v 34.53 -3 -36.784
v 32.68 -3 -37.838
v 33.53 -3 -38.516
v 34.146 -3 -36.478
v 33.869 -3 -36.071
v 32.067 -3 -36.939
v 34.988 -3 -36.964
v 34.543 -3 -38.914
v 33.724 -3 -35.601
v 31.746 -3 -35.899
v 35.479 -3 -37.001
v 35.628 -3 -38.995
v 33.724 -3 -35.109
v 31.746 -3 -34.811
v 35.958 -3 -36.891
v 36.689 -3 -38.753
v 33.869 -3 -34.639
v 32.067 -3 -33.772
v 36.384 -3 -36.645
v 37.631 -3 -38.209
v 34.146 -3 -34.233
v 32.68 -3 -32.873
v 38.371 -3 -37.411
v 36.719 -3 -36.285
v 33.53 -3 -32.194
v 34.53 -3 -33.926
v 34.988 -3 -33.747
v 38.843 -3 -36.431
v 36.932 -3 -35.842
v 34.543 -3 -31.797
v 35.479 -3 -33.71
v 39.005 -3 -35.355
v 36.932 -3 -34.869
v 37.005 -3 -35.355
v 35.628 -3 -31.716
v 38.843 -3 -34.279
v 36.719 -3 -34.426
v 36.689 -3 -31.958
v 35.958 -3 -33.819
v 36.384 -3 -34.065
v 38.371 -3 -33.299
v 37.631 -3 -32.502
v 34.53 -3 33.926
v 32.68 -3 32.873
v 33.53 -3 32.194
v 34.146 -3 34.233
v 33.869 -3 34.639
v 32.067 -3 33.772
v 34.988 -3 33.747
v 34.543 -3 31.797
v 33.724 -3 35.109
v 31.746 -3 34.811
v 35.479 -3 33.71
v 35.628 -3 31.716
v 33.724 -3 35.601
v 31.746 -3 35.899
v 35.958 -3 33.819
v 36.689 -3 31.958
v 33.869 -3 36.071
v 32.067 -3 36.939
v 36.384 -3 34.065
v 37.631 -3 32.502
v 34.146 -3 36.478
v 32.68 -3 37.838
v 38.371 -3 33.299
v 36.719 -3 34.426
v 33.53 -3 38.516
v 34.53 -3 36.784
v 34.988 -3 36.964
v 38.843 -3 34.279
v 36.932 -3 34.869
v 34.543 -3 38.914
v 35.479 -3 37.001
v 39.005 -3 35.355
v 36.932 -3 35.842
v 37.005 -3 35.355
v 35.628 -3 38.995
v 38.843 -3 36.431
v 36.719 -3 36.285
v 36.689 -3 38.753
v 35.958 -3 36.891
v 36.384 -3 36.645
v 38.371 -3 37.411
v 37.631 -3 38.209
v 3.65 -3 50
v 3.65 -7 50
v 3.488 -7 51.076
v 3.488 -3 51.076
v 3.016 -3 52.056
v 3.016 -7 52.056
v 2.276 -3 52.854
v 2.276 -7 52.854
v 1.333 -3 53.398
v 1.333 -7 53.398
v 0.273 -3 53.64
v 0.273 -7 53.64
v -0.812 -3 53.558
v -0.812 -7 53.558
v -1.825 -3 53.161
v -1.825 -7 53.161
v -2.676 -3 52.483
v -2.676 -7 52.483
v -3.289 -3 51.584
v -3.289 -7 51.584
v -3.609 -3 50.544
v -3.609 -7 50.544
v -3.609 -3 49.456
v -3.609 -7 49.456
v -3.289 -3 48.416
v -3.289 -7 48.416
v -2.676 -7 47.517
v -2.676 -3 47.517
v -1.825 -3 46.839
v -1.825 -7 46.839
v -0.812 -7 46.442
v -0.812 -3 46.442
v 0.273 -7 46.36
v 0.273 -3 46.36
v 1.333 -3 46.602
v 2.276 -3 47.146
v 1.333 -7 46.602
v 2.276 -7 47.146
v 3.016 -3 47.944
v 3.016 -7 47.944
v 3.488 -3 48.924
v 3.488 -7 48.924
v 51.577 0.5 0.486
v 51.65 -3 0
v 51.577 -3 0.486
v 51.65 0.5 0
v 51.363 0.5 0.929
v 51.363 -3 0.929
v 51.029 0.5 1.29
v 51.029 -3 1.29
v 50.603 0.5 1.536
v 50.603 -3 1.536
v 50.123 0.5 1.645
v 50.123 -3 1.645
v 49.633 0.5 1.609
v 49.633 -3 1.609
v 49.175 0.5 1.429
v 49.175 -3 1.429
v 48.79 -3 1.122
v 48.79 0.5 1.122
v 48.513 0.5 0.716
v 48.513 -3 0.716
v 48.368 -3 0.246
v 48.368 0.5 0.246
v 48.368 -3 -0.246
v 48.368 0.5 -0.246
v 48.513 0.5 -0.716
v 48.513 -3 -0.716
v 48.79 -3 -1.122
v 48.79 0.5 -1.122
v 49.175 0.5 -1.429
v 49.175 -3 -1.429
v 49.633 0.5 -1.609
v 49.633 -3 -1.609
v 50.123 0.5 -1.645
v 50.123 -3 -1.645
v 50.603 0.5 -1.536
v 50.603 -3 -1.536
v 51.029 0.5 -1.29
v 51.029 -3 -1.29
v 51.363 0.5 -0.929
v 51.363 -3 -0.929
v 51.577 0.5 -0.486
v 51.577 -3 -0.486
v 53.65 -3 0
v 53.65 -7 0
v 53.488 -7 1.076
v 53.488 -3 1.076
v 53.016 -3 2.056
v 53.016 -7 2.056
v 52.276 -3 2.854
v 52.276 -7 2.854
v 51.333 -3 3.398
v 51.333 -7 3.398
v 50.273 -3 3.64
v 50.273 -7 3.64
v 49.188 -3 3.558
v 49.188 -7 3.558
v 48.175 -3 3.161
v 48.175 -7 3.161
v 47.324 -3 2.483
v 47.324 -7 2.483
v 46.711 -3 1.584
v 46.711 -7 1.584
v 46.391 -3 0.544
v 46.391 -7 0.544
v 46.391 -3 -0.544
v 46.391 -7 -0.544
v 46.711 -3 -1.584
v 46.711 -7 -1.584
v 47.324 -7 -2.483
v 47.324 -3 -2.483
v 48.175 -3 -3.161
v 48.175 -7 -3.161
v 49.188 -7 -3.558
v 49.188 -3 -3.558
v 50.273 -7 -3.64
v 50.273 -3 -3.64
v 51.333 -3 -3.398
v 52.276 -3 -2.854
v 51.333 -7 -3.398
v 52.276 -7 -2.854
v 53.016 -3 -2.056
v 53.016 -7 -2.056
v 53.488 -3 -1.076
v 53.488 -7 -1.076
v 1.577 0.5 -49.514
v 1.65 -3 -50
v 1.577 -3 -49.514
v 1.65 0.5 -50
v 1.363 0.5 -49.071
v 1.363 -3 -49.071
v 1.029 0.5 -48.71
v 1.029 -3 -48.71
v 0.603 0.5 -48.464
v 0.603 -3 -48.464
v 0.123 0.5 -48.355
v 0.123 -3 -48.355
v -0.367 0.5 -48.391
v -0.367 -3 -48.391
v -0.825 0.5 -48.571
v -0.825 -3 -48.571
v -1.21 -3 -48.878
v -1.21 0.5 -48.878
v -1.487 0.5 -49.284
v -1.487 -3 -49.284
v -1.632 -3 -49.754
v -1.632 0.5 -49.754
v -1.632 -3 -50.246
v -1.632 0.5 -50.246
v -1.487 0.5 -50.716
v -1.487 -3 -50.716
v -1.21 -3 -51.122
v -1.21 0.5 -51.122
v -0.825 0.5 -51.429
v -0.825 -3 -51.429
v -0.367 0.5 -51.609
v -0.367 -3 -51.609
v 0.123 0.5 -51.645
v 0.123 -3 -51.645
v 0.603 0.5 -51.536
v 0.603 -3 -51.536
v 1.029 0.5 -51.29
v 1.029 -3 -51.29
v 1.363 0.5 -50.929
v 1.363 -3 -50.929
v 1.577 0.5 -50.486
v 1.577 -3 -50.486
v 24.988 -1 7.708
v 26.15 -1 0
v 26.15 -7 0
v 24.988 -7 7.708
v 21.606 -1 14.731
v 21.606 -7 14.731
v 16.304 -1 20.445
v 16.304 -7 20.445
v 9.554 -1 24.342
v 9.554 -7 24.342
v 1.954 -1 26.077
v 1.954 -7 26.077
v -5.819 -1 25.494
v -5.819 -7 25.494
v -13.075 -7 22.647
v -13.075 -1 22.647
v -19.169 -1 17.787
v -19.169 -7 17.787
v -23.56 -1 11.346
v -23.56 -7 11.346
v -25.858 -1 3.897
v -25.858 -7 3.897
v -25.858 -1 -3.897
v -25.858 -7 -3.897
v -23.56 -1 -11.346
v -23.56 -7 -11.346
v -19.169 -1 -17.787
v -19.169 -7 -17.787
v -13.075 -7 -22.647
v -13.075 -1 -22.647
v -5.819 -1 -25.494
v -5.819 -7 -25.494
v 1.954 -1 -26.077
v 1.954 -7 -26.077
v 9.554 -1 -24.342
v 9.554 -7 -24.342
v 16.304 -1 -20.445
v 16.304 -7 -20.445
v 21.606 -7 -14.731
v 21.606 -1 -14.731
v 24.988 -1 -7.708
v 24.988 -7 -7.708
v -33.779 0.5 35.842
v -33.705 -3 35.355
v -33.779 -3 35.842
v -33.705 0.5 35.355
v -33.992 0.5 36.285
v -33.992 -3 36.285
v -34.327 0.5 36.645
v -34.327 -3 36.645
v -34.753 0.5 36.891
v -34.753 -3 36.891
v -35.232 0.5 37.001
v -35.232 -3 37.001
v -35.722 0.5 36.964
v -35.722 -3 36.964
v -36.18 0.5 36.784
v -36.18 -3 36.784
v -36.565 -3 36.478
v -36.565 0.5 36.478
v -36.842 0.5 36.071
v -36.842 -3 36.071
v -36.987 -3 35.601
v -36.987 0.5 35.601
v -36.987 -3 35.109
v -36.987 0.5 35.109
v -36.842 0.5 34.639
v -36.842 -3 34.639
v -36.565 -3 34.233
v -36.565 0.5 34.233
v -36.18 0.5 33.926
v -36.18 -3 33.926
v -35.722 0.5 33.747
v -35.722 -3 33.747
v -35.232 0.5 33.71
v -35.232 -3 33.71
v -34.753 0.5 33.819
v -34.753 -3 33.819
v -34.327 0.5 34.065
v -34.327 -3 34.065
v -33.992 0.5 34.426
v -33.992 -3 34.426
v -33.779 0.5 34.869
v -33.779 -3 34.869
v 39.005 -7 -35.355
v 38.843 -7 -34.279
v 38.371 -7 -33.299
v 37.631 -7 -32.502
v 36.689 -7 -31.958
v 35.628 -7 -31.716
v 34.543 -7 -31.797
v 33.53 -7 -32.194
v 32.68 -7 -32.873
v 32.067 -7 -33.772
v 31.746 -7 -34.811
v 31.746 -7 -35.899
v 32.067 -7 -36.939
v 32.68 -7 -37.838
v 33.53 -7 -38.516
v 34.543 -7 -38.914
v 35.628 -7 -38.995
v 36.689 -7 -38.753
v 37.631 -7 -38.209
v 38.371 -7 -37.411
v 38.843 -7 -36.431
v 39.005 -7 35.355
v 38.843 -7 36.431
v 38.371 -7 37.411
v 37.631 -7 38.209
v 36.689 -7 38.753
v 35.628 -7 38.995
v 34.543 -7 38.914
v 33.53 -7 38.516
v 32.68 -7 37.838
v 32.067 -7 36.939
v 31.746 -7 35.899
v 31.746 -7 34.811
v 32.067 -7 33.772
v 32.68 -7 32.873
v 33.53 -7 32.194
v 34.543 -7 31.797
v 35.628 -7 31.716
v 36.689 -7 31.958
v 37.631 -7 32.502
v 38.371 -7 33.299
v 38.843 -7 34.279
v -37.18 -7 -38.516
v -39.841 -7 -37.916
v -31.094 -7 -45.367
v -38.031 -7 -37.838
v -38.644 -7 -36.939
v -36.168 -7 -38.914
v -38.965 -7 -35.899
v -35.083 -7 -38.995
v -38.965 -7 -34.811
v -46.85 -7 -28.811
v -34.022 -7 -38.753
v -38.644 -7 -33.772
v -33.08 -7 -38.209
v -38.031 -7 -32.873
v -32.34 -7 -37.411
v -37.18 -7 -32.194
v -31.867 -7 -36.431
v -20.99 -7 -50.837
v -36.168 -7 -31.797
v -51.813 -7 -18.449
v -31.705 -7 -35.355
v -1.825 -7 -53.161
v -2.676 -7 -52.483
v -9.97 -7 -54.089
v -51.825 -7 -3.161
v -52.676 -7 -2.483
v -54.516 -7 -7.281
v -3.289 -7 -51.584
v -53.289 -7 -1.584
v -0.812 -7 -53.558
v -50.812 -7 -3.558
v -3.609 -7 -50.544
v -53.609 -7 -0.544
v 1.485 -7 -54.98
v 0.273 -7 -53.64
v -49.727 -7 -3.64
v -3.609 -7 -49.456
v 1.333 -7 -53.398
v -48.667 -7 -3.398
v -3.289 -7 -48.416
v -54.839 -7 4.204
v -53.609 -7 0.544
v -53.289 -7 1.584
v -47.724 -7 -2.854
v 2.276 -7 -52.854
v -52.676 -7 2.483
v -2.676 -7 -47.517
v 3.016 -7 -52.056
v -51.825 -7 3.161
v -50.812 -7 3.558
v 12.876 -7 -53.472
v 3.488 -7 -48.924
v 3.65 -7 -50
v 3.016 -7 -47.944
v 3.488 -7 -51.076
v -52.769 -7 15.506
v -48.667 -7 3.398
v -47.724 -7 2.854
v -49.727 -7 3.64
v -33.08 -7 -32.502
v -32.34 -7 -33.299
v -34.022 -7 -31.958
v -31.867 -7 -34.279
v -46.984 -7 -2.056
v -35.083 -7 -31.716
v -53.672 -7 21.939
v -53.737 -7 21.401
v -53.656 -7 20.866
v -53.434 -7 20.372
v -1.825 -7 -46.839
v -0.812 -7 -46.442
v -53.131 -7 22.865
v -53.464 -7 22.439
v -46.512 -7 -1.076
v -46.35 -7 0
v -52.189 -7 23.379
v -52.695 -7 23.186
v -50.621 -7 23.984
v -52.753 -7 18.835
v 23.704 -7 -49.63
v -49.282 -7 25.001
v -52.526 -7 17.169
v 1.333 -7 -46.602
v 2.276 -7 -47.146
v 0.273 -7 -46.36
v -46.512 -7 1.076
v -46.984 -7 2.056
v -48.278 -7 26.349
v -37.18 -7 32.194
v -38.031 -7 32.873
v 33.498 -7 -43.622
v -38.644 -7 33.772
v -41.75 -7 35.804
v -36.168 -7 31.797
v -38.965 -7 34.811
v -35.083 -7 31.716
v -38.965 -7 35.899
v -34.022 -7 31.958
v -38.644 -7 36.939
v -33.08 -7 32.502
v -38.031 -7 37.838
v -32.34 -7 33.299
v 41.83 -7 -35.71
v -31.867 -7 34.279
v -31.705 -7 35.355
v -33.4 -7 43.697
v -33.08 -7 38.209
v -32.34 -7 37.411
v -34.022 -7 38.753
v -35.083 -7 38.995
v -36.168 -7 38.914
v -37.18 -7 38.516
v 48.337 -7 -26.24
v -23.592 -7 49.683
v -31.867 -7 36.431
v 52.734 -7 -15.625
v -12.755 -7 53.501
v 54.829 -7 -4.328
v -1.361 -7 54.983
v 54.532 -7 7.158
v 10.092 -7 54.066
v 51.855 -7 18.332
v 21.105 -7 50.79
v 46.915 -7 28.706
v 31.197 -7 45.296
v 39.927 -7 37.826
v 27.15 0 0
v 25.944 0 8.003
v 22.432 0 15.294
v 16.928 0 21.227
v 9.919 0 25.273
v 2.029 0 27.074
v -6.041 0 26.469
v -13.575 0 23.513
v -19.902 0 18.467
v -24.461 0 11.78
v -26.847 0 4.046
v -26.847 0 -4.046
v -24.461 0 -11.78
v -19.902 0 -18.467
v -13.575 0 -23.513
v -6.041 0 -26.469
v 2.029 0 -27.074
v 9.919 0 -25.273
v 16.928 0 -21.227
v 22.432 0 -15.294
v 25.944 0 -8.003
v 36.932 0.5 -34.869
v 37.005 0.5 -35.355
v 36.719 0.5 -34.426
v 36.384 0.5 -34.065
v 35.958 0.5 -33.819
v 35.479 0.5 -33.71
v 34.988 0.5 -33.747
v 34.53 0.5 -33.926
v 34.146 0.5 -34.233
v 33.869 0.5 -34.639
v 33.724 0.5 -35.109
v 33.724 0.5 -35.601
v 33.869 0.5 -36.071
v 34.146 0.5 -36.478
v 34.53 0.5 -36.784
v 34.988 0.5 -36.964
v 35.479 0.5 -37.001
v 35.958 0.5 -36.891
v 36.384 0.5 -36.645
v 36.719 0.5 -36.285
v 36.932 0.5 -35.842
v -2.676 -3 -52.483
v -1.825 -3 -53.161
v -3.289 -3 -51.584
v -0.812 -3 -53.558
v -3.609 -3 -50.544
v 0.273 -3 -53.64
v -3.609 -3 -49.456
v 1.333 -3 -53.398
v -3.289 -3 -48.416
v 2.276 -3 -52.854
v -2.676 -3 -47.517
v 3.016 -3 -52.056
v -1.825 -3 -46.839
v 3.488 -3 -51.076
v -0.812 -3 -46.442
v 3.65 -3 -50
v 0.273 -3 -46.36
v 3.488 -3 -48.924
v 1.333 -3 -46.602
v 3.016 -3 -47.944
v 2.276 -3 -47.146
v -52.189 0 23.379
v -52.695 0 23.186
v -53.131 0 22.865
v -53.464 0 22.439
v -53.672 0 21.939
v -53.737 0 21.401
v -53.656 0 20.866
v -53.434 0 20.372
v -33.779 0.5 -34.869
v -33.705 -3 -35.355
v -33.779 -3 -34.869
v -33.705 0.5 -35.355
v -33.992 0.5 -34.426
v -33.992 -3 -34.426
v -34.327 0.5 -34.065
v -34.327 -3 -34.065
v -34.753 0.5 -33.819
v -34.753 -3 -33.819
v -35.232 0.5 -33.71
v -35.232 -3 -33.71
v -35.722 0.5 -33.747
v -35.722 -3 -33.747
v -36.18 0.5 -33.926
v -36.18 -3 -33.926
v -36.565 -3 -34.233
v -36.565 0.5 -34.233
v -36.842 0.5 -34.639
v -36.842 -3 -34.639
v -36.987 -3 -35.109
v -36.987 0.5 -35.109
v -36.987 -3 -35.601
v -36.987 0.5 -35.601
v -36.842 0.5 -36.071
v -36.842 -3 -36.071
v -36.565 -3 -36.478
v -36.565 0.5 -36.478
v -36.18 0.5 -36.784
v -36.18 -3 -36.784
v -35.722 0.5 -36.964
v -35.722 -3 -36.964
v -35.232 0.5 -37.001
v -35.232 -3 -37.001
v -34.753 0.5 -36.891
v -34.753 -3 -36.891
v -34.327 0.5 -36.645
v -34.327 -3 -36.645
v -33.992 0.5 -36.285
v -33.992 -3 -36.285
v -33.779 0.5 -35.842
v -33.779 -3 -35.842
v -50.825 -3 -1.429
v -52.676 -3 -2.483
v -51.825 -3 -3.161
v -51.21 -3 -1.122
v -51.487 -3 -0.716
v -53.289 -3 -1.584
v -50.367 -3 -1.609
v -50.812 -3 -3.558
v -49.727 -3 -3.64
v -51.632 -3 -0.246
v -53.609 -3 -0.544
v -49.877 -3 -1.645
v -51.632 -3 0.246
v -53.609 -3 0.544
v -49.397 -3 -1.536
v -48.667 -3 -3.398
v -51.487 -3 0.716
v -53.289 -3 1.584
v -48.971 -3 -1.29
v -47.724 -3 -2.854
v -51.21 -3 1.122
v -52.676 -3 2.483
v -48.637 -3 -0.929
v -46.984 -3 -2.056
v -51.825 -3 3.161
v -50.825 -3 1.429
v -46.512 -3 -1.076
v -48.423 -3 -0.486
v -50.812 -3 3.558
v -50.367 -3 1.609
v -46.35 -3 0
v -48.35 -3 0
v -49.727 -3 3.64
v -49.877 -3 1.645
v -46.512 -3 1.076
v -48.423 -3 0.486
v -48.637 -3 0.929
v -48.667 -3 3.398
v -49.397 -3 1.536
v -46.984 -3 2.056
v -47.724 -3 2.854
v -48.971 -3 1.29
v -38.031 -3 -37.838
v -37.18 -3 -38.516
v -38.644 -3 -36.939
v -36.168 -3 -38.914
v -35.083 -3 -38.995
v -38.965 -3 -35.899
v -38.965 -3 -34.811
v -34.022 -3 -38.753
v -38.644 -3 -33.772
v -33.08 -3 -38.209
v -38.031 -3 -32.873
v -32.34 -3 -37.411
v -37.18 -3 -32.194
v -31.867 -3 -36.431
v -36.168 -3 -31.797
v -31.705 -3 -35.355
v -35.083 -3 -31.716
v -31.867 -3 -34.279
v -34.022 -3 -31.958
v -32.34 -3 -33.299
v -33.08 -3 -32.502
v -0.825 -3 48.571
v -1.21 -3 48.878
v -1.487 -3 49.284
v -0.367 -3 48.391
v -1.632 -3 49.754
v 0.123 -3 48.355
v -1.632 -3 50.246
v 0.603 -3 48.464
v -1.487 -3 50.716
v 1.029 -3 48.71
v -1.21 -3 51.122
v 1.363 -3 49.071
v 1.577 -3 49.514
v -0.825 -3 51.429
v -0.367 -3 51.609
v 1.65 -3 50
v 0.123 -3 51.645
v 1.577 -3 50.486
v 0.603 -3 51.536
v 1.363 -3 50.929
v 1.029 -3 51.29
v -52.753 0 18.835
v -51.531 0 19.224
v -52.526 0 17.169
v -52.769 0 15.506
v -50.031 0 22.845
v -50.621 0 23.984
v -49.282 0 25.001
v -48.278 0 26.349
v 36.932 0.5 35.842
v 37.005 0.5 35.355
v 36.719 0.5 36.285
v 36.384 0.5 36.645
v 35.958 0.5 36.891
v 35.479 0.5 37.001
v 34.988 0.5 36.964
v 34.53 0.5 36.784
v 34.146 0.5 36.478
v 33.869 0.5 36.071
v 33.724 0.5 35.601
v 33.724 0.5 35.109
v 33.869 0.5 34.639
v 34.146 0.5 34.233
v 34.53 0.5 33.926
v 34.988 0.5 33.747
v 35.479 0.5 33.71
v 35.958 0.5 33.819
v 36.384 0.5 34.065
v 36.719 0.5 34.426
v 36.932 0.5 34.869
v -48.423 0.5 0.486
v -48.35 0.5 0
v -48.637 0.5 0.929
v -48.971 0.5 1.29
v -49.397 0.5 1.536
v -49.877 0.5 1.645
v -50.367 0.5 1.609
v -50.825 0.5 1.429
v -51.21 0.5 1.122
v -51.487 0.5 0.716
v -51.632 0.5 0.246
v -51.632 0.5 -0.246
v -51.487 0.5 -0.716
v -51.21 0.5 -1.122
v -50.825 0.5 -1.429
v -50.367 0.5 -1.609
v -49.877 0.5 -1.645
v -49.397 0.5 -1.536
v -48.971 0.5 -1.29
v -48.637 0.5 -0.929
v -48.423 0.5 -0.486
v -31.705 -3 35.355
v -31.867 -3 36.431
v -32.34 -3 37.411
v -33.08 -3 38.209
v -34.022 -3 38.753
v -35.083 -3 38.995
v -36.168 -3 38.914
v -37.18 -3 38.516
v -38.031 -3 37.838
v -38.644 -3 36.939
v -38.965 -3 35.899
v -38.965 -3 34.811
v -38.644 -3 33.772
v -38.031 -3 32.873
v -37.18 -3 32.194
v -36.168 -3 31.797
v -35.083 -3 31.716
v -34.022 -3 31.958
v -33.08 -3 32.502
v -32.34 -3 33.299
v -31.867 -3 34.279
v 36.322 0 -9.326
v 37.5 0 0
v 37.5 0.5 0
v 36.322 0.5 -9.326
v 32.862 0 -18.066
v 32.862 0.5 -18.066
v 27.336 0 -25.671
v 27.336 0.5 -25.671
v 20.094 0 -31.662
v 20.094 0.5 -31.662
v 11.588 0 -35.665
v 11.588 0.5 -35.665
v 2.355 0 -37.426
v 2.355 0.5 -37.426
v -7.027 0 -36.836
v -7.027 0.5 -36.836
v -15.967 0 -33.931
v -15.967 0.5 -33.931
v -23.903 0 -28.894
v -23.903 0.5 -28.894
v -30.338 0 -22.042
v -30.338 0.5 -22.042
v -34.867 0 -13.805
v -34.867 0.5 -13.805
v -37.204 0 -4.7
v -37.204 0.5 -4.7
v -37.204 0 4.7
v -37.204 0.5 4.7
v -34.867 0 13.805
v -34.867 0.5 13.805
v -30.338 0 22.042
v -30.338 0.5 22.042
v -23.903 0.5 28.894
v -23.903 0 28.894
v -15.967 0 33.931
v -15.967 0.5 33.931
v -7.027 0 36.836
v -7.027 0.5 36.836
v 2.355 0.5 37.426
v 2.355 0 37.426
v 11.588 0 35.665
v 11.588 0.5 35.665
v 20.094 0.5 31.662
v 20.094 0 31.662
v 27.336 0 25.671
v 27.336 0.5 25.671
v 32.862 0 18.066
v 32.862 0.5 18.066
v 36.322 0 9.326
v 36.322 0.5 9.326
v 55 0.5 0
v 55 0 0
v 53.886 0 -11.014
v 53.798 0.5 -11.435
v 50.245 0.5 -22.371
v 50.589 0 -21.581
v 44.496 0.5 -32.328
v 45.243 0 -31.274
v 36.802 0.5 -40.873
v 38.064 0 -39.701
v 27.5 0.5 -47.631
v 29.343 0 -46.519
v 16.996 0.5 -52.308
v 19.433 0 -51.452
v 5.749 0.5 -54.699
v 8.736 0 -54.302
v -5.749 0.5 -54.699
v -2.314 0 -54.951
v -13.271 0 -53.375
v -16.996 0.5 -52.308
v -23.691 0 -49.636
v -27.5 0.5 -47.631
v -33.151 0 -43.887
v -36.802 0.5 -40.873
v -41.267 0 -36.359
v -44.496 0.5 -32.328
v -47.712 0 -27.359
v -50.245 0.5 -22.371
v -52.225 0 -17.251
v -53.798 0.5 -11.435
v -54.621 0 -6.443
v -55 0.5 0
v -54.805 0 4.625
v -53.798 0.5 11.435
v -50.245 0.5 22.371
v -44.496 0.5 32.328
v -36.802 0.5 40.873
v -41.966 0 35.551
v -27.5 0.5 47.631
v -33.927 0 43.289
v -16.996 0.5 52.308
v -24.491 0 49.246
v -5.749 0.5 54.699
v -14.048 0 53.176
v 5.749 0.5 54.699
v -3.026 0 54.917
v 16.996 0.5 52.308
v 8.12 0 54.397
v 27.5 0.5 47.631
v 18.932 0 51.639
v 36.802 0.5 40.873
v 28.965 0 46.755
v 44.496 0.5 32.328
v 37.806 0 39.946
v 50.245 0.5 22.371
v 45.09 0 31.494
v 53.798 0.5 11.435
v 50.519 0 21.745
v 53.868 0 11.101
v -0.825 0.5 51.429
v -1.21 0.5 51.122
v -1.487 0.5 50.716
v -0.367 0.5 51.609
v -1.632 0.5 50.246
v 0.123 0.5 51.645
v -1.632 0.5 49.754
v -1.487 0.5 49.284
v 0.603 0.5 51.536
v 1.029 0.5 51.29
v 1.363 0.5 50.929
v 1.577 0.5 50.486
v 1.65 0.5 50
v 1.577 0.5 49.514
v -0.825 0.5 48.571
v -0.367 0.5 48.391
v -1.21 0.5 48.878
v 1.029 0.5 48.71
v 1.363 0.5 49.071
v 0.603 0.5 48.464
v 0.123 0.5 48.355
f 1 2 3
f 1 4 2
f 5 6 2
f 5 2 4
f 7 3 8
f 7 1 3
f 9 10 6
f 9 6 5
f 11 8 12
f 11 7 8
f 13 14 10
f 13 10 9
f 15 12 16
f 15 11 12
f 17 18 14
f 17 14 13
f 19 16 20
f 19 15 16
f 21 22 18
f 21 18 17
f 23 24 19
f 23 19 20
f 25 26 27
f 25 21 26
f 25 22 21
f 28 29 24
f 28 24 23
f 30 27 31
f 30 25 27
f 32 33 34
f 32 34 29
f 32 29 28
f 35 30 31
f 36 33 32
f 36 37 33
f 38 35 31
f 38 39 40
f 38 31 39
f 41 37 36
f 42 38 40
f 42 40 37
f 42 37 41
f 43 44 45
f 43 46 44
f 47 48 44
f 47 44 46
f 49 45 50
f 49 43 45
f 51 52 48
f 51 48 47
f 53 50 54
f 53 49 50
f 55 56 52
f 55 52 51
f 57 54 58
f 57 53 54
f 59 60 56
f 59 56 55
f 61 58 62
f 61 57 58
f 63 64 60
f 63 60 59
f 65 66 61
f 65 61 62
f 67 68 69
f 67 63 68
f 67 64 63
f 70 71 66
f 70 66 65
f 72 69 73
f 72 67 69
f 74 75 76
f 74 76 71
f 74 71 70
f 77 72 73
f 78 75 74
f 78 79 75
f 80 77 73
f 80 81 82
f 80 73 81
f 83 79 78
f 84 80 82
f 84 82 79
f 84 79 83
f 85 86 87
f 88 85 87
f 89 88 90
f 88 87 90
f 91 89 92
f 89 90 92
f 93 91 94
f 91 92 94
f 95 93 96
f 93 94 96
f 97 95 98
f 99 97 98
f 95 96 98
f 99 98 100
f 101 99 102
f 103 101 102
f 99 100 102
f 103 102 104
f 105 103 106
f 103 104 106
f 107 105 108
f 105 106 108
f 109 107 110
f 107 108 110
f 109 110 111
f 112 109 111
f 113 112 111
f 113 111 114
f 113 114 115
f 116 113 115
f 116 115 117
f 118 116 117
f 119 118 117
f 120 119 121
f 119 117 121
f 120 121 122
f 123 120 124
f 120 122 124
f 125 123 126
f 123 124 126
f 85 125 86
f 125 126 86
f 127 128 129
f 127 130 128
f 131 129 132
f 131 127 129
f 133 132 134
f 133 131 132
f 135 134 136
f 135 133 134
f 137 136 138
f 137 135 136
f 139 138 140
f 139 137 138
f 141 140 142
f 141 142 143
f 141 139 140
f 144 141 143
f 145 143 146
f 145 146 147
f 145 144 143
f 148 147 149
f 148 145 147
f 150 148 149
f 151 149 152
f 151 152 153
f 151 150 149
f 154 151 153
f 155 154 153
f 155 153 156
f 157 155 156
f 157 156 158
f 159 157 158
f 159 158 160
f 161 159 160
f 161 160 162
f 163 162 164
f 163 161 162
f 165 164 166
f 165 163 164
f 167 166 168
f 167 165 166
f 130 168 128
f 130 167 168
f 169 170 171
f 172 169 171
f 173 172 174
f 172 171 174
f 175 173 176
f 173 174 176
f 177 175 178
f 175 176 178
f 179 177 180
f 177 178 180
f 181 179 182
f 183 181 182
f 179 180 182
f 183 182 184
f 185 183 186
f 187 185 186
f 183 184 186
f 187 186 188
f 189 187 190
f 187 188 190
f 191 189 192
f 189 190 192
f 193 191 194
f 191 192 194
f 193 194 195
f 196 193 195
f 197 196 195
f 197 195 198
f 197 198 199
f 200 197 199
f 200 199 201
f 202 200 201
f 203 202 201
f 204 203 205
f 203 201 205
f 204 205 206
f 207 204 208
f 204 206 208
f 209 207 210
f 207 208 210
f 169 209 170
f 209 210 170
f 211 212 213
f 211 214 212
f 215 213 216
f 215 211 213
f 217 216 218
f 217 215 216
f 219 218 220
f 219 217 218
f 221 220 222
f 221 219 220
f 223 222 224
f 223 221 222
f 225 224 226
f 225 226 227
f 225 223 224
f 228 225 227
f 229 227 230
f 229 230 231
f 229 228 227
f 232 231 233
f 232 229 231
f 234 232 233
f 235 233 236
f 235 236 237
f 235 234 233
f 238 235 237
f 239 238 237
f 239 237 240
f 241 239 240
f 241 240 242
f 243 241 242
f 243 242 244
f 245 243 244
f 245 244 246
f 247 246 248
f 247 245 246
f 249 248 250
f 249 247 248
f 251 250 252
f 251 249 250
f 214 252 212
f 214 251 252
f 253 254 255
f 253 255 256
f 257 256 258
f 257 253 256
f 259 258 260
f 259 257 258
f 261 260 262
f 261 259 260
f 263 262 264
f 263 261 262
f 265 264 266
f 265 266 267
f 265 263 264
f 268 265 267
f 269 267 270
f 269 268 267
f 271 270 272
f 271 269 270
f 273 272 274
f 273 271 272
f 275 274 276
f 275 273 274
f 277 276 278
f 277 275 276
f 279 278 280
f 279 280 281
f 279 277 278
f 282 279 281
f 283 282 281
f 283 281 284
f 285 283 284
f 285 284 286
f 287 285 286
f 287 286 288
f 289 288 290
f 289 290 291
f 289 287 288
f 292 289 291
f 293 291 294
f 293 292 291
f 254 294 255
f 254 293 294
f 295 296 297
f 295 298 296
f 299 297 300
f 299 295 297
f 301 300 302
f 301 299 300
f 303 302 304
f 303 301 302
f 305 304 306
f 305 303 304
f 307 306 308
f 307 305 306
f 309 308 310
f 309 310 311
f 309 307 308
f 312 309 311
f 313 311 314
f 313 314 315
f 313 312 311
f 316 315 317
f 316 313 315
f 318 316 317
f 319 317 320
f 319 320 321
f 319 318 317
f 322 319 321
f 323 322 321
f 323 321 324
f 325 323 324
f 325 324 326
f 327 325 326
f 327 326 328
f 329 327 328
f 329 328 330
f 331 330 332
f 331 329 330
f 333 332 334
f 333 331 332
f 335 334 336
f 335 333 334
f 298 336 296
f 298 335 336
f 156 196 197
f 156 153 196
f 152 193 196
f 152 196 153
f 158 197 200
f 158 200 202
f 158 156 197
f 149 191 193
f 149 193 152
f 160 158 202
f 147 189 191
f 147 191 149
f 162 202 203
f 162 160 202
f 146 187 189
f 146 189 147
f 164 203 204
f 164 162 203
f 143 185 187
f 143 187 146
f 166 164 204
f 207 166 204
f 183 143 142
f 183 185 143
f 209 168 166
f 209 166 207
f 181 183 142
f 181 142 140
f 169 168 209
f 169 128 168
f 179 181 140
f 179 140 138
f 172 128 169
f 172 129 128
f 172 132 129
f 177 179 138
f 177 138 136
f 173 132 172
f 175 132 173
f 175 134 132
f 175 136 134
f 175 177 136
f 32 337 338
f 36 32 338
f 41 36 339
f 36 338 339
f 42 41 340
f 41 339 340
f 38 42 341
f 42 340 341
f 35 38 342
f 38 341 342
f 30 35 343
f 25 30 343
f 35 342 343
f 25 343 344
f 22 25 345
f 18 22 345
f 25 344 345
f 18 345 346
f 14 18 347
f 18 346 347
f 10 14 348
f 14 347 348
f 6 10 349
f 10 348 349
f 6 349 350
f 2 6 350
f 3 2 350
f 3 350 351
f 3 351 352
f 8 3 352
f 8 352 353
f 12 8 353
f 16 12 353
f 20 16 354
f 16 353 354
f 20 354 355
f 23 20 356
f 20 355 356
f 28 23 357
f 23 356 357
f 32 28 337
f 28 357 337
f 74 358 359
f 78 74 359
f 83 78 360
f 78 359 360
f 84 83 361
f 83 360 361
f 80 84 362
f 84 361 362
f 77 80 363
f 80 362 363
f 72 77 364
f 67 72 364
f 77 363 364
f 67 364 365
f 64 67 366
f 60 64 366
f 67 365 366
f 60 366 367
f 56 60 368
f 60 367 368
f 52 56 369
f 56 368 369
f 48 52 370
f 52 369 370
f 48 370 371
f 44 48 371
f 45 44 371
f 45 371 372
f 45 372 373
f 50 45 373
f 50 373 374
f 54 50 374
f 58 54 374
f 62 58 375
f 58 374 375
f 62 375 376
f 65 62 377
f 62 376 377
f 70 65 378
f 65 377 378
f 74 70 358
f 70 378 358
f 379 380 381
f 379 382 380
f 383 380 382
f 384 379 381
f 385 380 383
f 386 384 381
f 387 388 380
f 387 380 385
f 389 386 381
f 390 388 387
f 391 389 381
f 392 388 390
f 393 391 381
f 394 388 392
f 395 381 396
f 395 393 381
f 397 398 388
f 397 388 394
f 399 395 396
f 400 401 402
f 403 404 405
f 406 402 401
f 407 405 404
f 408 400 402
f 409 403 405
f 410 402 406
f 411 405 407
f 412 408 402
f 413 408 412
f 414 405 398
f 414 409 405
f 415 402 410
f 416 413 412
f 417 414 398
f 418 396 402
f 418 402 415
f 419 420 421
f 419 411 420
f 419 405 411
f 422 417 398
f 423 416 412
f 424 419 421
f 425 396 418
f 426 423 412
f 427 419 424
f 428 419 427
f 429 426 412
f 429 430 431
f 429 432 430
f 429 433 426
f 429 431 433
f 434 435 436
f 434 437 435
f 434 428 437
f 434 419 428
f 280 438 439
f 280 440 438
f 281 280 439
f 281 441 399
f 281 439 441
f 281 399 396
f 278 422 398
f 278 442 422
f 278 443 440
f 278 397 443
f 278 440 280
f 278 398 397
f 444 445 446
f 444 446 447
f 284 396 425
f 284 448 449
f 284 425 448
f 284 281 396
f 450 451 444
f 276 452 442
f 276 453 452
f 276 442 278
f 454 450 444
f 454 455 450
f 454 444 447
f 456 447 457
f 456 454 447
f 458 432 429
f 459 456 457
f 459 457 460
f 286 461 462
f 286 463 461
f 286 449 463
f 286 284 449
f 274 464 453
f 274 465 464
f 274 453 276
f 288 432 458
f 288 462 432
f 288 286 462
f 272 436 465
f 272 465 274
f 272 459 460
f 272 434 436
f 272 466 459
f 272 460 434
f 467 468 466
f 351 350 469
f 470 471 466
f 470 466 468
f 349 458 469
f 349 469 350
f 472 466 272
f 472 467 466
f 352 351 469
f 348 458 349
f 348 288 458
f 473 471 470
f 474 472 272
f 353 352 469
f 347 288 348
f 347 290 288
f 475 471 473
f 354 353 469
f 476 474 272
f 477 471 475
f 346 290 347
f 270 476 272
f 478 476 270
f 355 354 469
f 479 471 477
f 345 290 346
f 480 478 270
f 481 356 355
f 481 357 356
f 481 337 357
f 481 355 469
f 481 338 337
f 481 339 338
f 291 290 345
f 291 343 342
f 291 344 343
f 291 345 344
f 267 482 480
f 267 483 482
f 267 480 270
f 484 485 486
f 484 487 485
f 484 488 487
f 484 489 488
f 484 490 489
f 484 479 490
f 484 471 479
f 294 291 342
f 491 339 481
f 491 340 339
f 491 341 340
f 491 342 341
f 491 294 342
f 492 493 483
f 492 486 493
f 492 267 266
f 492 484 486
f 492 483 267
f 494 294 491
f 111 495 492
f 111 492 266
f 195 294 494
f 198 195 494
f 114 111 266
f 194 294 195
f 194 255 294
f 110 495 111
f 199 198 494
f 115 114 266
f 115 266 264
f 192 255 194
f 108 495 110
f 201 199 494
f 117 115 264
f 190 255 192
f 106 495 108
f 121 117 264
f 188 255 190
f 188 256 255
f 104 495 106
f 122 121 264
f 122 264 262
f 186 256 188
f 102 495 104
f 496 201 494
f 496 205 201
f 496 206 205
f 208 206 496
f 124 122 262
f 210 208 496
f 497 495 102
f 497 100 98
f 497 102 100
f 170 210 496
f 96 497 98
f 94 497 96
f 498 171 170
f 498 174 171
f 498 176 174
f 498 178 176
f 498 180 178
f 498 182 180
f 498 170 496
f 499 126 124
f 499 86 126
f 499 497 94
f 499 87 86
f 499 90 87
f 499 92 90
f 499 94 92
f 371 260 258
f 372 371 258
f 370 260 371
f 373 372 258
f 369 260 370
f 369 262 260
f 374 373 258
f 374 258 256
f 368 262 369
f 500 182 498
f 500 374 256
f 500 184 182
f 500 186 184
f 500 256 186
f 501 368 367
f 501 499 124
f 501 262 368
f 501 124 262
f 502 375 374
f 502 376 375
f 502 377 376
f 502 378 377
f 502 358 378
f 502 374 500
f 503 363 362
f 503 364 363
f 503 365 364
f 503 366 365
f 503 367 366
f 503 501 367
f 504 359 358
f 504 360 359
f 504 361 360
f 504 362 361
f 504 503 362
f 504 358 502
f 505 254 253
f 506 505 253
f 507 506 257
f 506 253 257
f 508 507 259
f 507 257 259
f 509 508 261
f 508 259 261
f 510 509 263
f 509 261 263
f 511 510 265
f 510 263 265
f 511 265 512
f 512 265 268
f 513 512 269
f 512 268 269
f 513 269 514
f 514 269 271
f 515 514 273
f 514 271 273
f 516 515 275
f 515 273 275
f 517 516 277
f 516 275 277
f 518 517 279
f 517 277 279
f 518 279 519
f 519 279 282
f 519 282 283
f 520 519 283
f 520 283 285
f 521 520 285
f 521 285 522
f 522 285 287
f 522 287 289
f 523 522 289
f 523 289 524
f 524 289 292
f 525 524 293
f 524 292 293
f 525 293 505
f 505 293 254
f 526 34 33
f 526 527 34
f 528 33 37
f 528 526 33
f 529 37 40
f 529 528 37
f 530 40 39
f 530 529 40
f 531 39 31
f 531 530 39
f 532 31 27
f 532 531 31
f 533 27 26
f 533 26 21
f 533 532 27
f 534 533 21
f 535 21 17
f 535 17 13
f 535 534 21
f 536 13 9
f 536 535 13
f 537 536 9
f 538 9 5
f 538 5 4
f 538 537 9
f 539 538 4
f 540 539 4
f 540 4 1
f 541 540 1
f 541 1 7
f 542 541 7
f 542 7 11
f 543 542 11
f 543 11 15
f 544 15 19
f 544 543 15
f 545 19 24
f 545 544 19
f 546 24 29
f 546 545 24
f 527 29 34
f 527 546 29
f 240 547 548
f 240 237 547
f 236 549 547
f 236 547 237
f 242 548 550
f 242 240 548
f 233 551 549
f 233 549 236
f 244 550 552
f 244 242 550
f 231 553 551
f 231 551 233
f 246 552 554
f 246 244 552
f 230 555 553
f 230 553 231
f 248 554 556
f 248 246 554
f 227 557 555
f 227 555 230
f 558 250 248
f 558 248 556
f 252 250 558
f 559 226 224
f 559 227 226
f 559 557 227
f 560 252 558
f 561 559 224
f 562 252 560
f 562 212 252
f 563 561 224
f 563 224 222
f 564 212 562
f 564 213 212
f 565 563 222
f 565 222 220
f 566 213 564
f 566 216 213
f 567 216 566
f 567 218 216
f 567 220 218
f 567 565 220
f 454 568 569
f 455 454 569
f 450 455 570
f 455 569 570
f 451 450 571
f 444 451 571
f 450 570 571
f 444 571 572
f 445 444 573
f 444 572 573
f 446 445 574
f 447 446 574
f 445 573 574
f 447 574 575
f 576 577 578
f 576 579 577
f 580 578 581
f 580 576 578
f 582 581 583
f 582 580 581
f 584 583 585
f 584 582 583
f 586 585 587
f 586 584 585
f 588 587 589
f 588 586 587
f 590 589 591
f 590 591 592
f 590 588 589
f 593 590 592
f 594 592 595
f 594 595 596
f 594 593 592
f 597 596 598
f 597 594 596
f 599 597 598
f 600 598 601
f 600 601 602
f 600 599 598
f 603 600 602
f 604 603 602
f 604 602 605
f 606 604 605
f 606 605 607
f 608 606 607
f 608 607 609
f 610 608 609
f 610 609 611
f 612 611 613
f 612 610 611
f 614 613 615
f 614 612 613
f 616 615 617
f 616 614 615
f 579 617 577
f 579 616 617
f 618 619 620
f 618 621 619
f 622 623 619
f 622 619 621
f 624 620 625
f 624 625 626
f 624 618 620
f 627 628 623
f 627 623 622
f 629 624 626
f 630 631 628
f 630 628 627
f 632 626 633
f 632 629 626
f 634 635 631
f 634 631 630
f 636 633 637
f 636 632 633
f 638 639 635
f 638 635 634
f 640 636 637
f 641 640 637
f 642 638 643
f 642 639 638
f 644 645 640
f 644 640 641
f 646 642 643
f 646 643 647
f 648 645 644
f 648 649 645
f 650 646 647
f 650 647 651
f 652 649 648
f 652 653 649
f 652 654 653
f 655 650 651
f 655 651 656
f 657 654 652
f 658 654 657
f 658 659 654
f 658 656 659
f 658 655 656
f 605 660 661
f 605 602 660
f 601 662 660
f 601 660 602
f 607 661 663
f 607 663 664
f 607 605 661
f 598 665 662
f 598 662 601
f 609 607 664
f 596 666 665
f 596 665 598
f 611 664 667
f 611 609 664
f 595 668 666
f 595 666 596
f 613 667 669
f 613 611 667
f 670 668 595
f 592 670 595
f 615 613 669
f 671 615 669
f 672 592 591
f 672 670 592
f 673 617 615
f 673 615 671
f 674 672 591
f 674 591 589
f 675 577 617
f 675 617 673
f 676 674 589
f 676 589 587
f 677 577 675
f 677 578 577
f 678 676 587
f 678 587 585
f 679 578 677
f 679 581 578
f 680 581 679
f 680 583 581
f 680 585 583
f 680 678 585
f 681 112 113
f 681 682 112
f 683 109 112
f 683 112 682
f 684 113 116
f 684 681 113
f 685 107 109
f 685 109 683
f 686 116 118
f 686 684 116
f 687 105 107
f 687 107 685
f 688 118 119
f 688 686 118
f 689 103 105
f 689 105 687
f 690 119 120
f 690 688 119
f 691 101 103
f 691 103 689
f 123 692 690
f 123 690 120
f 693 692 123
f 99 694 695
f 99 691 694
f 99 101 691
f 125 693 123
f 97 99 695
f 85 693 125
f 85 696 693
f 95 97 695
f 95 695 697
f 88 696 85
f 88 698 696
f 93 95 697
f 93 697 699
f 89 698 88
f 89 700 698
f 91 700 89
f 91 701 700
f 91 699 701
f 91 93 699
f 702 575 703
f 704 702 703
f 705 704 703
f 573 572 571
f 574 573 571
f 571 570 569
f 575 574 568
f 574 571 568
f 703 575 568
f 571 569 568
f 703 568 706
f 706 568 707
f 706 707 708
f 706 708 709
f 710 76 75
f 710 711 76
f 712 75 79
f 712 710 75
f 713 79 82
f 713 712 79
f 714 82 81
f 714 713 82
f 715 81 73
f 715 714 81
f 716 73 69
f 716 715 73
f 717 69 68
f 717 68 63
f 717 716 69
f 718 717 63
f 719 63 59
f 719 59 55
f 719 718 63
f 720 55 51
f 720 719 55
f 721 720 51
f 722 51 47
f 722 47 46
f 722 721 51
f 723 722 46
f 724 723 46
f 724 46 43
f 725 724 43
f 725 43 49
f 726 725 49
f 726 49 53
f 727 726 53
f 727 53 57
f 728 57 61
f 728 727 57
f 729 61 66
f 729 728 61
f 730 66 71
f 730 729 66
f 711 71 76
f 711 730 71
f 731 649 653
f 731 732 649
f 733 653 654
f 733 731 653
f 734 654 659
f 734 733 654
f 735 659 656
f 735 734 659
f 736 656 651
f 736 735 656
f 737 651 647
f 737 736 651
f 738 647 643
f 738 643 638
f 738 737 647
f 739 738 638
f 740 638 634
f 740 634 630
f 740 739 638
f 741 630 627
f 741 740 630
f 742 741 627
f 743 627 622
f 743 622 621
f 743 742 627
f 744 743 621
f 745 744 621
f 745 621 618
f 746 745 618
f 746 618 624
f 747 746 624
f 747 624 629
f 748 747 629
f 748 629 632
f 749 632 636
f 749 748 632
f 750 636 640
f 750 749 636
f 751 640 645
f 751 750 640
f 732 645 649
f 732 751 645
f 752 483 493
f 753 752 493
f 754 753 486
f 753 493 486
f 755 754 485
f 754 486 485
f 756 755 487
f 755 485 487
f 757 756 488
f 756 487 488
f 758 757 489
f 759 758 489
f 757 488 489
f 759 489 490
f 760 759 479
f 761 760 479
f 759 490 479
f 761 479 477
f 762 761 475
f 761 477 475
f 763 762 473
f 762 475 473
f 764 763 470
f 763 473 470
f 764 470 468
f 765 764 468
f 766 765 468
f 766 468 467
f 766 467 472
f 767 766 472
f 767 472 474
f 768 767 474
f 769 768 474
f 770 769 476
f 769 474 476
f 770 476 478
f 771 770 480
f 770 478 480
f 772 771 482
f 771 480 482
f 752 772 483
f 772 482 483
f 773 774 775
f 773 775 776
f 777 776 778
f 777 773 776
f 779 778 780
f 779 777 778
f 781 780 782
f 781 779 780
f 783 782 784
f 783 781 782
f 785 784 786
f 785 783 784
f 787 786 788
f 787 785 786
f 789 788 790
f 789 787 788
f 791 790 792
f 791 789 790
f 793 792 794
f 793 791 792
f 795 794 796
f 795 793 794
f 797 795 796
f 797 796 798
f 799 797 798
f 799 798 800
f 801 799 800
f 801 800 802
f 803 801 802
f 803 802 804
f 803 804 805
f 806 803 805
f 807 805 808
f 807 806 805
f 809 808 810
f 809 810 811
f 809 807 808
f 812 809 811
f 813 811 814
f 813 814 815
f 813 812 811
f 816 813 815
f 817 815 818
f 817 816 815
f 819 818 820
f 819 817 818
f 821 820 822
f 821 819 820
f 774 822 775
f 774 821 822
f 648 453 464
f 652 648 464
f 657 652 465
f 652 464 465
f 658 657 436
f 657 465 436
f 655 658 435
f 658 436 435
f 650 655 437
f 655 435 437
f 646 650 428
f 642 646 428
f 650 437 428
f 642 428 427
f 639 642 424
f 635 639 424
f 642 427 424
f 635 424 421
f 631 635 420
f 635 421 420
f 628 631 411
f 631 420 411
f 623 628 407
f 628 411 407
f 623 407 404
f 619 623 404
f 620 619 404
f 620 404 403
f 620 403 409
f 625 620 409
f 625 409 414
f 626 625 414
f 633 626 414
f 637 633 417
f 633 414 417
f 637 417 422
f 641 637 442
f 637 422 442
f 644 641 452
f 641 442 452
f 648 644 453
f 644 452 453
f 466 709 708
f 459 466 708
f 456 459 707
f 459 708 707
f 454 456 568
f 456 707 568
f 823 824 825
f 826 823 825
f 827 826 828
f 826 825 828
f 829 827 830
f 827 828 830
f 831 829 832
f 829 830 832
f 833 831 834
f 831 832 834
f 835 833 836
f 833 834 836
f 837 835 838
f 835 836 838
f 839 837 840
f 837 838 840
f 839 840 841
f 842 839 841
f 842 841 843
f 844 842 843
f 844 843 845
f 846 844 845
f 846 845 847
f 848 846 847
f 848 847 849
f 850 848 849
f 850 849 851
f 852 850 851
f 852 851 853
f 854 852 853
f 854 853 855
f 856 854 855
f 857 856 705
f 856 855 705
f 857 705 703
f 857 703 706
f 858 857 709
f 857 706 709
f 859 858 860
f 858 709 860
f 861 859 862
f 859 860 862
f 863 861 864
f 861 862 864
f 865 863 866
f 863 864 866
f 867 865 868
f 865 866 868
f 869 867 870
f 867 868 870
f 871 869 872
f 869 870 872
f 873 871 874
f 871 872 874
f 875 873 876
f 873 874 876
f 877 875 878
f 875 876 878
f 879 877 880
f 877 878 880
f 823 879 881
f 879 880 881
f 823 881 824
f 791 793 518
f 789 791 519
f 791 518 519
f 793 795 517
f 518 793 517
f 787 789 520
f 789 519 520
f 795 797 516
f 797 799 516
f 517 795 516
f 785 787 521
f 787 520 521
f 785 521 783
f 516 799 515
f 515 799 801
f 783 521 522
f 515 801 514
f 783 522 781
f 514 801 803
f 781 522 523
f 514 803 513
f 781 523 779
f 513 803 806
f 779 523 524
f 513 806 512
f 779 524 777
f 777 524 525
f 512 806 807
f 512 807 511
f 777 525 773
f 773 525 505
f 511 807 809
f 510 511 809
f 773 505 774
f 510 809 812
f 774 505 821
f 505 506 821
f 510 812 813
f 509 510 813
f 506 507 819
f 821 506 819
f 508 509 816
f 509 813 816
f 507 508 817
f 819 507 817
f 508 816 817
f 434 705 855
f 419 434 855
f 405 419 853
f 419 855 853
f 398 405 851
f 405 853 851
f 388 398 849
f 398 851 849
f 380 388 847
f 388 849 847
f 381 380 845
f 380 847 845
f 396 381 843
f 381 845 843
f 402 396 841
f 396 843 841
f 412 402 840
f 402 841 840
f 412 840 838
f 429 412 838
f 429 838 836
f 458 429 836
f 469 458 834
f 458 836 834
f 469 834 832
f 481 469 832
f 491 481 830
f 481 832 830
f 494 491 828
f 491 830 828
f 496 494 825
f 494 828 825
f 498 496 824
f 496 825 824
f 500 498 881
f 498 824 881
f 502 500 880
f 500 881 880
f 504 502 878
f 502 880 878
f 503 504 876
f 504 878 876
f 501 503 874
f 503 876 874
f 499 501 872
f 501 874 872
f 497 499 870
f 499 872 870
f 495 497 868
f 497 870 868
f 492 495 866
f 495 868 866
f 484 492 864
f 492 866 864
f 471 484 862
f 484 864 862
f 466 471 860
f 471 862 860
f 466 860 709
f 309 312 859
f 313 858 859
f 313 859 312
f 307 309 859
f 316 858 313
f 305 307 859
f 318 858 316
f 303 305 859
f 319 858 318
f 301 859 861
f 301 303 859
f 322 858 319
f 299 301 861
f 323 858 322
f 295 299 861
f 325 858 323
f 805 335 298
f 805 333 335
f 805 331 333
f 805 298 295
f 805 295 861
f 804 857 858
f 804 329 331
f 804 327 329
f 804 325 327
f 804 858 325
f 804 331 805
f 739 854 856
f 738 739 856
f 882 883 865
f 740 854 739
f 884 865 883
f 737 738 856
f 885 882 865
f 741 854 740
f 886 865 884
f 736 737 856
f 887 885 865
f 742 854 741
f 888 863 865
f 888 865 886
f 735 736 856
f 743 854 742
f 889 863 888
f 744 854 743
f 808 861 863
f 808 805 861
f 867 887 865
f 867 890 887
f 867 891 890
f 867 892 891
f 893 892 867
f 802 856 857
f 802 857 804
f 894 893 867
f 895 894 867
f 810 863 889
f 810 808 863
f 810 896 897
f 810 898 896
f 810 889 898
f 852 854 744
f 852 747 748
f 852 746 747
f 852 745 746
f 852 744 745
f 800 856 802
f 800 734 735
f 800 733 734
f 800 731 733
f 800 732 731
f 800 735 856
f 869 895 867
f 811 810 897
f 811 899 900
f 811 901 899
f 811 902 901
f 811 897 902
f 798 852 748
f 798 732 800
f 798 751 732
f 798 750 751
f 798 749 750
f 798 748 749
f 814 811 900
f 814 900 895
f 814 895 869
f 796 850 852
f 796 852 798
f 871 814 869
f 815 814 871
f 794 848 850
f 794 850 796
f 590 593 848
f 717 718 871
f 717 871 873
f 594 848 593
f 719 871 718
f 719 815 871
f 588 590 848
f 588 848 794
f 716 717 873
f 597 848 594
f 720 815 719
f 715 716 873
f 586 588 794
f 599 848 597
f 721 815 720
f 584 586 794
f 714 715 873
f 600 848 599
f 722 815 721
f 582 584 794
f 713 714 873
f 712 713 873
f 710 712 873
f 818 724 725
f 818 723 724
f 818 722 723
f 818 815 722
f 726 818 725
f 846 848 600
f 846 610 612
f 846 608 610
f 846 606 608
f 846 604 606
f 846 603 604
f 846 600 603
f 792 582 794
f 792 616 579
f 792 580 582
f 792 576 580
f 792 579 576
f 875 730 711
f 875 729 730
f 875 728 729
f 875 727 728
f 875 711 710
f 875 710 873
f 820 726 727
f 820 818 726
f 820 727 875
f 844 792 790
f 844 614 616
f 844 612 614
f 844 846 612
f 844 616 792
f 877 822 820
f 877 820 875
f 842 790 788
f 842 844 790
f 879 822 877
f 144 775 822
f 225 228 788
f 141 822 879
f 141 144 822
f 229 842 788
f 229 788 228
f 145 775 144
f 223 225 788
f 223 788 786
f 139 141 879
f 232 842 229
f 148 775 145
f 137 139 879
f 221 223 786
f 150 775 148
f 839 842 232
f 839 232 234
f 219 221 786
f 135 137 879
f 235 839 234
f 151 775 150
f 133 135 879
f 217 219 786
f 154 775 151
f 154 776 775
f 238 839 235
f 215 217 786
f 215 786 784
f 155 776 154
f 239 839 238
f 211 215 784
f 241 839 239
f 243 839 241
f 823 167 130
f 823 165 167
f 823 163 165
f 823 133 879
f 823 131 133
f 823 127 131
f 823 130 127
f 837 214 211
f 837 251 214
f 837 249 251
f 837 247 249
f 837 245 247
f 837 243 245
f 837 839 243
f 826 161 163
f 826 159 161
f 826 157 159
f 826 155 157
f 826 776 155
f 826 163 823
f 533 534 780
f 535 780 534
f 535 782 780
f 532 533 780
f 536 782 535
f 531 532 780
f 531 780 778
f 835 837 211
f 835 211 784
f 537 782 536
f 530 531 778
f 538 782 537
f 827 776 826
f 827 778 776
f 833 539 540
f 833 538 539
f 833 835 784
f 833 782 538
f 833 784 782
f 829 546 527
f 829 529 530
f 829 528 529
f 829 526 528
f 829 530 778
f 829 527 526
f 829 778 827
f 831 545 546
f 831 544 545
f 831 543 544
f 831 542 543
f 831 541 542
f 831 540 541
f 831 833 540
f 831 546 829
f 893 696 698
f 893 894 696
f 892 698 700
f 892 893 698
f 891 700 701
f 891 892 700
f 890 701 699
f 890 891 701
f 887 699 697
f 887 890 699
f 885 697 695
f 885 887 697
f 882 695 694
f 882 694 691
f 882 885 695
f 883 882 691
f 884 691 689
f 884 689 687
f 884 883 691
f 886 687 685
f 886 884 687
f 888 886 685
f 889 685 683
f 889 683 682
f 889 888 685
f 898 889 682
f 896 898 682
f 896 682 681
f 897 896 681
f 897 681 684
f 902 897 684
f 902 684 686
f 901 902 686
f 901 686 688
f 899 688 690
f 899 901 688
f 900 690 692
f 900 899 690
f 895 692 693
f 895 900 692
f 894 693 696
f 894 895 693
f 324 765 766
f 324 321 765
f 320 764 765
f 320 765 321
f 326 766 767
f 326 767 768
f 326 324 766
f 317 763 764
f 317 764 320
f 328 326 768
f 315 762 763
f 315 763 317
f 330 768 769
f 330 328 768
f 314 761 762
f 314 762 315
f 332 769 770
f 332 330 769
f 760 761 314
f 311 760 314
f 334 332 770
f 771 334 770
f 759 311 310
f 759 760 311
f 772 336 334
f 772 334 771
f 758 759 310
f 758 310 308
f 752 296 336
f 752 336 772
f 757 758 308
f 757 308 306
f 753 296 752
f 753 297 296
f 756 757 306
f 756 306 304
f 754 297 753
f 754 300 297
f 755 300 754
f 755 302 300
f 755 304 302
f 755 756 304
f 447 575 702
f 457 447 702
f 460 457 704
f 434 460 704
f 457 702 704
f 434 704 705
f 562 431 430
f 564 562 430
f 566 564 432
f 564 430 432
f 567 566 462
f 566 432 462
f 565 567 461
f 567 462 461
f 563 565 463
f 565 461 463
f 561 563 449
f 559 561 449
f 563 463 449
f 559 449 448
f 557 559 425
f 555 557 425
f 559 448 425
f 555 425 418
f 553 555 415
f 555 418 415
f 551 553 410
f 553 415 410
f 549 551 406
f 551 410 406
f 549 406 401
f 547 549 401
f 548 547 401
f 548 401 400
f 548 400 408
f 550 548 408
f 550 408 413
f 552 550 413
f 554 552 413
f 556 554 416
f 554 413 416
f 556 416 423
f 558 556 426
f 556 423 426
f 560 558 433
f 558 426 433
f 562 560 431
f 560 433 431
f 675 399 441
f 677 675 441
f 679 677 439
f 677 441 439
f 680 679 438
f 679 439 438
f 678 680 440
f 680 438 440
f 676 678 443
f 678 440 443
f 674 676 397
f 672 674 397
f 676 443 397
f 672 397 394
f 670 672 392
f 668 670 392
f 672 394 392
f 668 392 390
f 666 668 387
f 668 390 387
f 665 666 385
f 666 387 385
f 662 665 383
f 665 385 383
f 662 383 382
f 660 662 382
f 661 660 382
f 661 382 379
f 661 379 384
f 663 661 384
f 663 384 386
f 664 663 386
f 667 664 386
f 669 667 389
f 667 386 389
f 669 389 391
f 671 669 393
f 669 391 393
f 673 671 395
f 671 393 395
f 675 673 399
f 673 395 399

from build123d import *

# Parameters (mm, degrees)
SKETCH1_R           = 55
SKETCH1_R_2         = 37.5
SKETCH1_R_3         = 1.65
BOSS_EXTRUDE1_DEPTH = 0.5
SKETCH2_R           = 26.15
SKETCH2_R_2         = 1.65
BOSS_EXTRUDE2_DEPTH = 7
CHAMFER1_SIZE       = 1
SKETCH3_R           = 3.65
SKETCH3_R_2         = 1.65
CUT_EXTRUDE1_DEPTH  = 4


with BuildPart() as part:
    # Sketch1 → Boss-Extrude1 (new body)
    with BuildSketch(Plane(origin=(0, 0, 0), x_dir=(1, 0, 0), z_dir=(0, 1, 0))):
        Circle(SKETCH1_R)
        Circle(SKETCH1_R_2, mode=Mode.SUBTRACT)
        with Locations((0, 50)):
            Circle(SKETCH1_R_3, mode=Mode.SUBTRACT)
        with Locations((35.355339059, 35.355339059)):
            Circle(SKETCH1_R_3, mode=Mode.SUBTRACT)
        with Locations((50, 0)):
            Circle(SKETCH1_R_3, mode=Mode.SUBTRACT)
        with Locations((35.355339059, -35.355339059)):
            Circle(SKETCH1_R_3, mode=Mode.SUBTRACT)
        with Locations((0, -50)):
            Circle(SKETCH1_R_3, mode=Mode.SUBTRACT)
        with Locations((-35.355339059, -35.355339059)):
            Circle(SKETCH1_R_3, mode=Mode.SUBTRACT)
        with Locations((-50, 0)):
            Circle(SKETCH1_R_3, mode=Mode.SUBTRACT)
        with Locations((-35.355339059, 35.355339059)):
            Circle(SKETCH1_R_3, mode=Mode.SUBTRACT)
    extrude(amount=BOSS_EXTRUDE1_DEPTH)

    # Sketch2 → Boss-Extrude2 (add)
    with BuildSketch(Plane.XZ):
        with BuildLine():
            ThreePointArc((-52.76902678, 15.505799326), (50.813374288, -21.04758878), (-48.277592523, 26.349080822))
            ThreePointArc((-48.277592523, 26.349080822), (-49.915423513, 24.445273361), (-52.189000111, 23.37858566))
            ThreePointArc((-52.189000111, 23.37858566), (-53.585012886, 22.195639077), (-53.434352336, 20.372039427))
            ThreePointArc((-53.434352336, 20.372039427), (-52.580953013, 18.01011589), (-52.76902678, 15.505799326))
        make_face()
        Circle(SKETCH2_R, mode=Mode.SUBTRACT)
        with Locations((0, -50)):
            Circle(SKETCH2_R_2, mode=Mode.SUBTRACT)
        with Locations((35.355339059, -35.355339059)):
            Circle(SKETCH2_R_2, mode=Mode.SUBTRACT)
        with Locations((50, 0)):
            Circle(SKETCH2_R_2, mode=Mode.SUBTRACT)
        with Locations((35.355339059, 35.355339059)):
            Circle(SKETCH2_R_2, mode=Mode.SUBTRACT)
        with Locations((0, 50)):
            Circle(SKETCH2_R_2, mode=Mode.SUBTRACT)
        with Locations((-35.355339059, 35.355339059)):
            Circle(SKETCH2_R_2, mode=Mode.SUBTRACT)
        with Locations((-50, 0)):
            Circle(SKETCH2_R_2, mode=Mode.SUBTRACT)
        with Locations((-35.355339059, -35.355339059)):
            Circle(SKETCH2_R_2, mode=Mode.SUBTRACT)
    extrude(amount=BOSS_EXTRUDE2_DEPTH)

    # Chamfer1
    chamfer1_edges = [part.edges().sort_by_distance(p)[0] for p in [
        (-26.15, 0, 0),
    ]]
    chamfer(chamfer1_edges, length=CHAMFER1_SIZE)

    # Sketch3 → Cut-Extrude1 (cut)
    with BuildSketch(Plane.XZ.offset(7)):
        with Locations((-50, 0)):
            Circle(SKETCH3_R)
        with Locations((-50, 0)):
            Circle(SKETCH3_R_2, mode=Mode.SUBTRACT)
        with Locations((-35.355339059, -35.355339059)):
            Circle(SKETCH3_R)
        with Locations((-35.355339059, -35.355339059)):
            Circle(SKETCH3_R_2, mode=Mode.SUBTRACT)
        with Locations((0, -50)):
            Circle(SKETCH3_R)
        with Locations((0, -50)):
            Circle(SKETCH3_R_2, mode=Mode.SUBTRACT)
        with Locations((35.355339059, -35.355339059)):
            Circle(SKETCH3_R)
        with Locations((35.355339059, -35.355339059)):
            Circle(SKETCH3_R_2, mode=Mode.SUBTRACT)
        with Locations((50, 0)):
            Circle(SKETCH3_R)
        with Locations((50, 0)):
            Circle(SKETCH3_R_2, mode=Mode.SUBTRACT)
        with Locations((35.355339059, 35.355339059)):
            Circle(SKETCH3_R)
        with Locations((35.355339059, 35.355339059)):
            Circle(SKETCH3_R_2, mode=Mode.SUBTRACT)
        with Locations((0, 50)):
            Circle(SKETCH3_R)
        with Locations((0, 50)):
            Circle(SKETCH3_R_2, mode=Mode.SUBTRACT)
        with Locations((-35.355339059, 35.355339059)):
            Circle(SKETCH3_R)
        with Locations((-35.355339059, 35.355339059)):
            Circle(SKETCH3_R_2, mode=Mode.SUBTRACT)
    extrude(amount=-CUT_EXTRUDE1_DEPTH, mode=Mode.SUBTRACT)


solid = part.part
